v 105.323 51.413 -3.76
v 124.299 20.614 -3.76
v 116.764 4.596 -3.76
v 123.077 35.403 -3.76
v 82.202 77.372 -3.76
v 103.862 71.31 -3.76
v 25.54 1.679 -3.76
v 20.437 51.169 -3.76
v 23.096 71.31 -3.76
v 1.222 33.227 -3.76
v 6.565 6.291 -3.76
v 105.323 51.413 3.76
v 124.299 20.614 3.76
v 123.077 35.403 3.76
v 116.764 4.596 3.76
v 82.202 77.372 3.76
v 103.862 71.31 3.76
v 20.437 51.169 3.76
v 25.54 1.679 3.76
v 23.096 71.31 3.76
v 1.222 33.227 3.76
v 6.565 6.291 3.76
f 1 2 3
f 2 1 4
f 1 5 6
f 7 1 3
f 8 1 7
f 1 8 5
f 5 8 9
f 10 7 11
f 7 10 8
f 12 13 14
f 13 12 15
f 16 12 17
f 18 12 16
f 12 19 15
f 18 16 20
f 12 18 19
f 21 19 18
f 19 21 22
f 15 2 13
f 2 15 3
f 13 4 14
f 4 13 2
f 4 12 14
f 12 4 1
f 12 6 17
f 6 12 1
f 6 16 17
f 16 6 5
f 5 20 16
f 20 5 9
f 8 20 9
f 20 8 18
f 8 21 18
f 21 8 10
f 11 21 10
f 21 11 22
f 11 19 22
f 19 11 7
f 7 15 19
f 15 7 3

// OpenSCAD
/* doodle-meta {"version":1,"parameters":{"width":{"label":"Overall width","description":"Changes the body width","unit":"mm","feature":"body_width"},"height":{"label":"Overall height","description":"Changes the body height","unit":"mm","feature":"body_height"},"thickness":{"label":"Panel thickness","description":"Changes the panel depth","unit":"mm","feature":"body_thickness"},"slot_count":{"label":"Grille slot count","description":"Number of vertical grille slots","unit":"count","feature":"grille_slots"},"slot_width":{"label":"Grille slot width","description":"Width of each vertical grille slot","unit":"mm","feature":"grille_slots"},"slot_height":{"label":"Grille slot height","description":"Height of each vertical grille slot","unit":"mm","feature":"grille_slots"},"headlight_diameter":{"label":"Headlight diameter","description":"Diameter of the circular headlight cutouts","unit":"mm","feature":"headlights"}},"features":{"body_width":{"kind":"dimension","axis":"x","label":"Overall width"},"body_height":{"kind":"dimension","axis":"z","label":"Overall height"},"body_thickness":{"kind":"dimension","axis":"y","label":"Panel thickness"},"grille_slots":{"kind":"region","label":"Grille slots","min":[{"parameter":"width","scale":0.35},{"parameter":"thickness","scale":-0.1},{"parameter":"height","scale":0.13}],"max":[{"parameter":"width","scale":0.65},{"parameter":"thickness","scale":1.1},{"parameter":"height","scale":0.74}]},"headlights":{"kind":"region","label":"Headlights","min":[{"parameter":"width","scale":0.09},{"parameter":"thickness","scale":-0.1},{"parameter":"height","scale":0.37}],"max":[{"parameter":"width","scale":0.91},{"parameter":"thickness","scale":1.1},{"parameter":"height","scale":0.75}]}}} */

// Parameters
width = 126.0;
height = 78.83;
thickness = 7.52;
slot_count = 7;
slot_width = 5.1;
slot_height = 48.0;
headlight_diameter = 20.8;

// Derived sizes
eps = 0.01;
slot_pitch = width * 0.0625; // Approximate pitch based on measured centers
slot_start_x = width * 0.31; // Center of first slot
headlight_x = width * 0.175; // Center of left headlight
headlight_z = height * 0.563; // Center of headlights (from bottom)

module grille_body() {
    // Main panel body
    // The outer profile is roughly rectangular with rounded corners in the front view.
    // We approximate it with a cube for the main body, as the polygon is complex and 
    // the intent is a flat panel. The "rounded corners" in the description might refer 
    // to the overall shape or specific features, but a rectangular panel is the safest 
    // interpretation of "flat panel" with "complex outer boundary" that is mostly rectangular.
    // However, looking at the polygon, it has angled sides. 
    // Let's create a polygon for the front face and extrude it.
    
    // Front face polygon points (X, Z) normalized to 0..1 then scaled
    // Using the measured outer profile from view_2
    // Note: The polygon is defined in view coordinates (u, v).
    // u -> X, v -> Z (inverted because v is down, Z is up)
    
    polygon_points = [
        [0.0097 * width, (1 - 0.5785) * height],
        [0.0521 * width, (1 - 0.9202) * height],
        [0.2027 * width, (1 - 0.9787) * height],
        [0.9267 * width, (1 - 0.9417) * height],
        [0.9865 * width, (1 - 0.7385) * height],
        [0.9768 * width, (1 - 0.5509) * height],
        [0.8359 * width, (1 - 0.3478) * height],
        [0.8243 * width, (1 - 0.0954) * height],
        [0.6524 * width, (1 - 0.0185) * height],
        [0.1833 * width, (1 - 0.0954) * height],
        [0.1622 * width, (1 - 0.3509) * height]
    ];
    
    // Extrude the polygon along Y
    linear_extrude(height = thickness, center = true) {
        polygon(polygon_points);
    }
}

module headlight_cutout(x_pos) {
    // Circular cutout through the panel
    // Axis is Y (front-to-back)
    translate([x_pos, 0, headlight_z]) {
        rotate([90, 0, 0]) {
            cylinder(h = thickness + 2*eps, d = headlight_diameter, center = true);
        }
    }
}

module grille_slot(x_pos) {
    // Vertical rectangular slot
    // Axis is Y (front-to-back)
    // Slot is centered at x_pos, and vertically centered at height/2 roughly?
    // Measured center v is ~0.437. 
    // Z_center = (1 - 0.437) * height = 0.563 * height
    z_center = (1 - 0.437) * height;
    
    translate([x_pos, 0, z_center]) {
        cube([slot_width, thickness + 2*eps, slot_height], center = true);
    }
}

// Main design
difference() {
    // 1. Positive Body
    grille_body();
    
    // 2. Subtract Headlights
    headlight_cutout(headlight_x);
    headlight_cutout(width - headlight_x);
    
    // 3. Subtract Grille Slots
    for (i = [0 : slot_count - 1]) {
        // Calculate position for each slot
        // The slots are centered around the middle.
        // Total width of slots array = (slot_count - 1) * pitch
        // Start X = Center - TotalWidth/2
        // Or simply use the measured start and pitch.
        // Measured centers: 0.3098, 0.3736, 0.4353, 0.499, 0.5628, 0.6264, 0.6891
        // These are roughly evenly spaced.
        // Let's use the measured center of the first slot and the pitch.
        // First slot center u = 0.3098 -> X = 0.3098 * width
        // Pitch in u = (0.6891 - 0.3098) / 6 = 0.0632
        // Pitch in mm = 0.0632 * width
        
        slot_pitch_mm = (0.6891 - 0.3098) / 6 * width;
        slot_start_x_mm = 0.3098 * width;
        
        current_x = slot_start_x_mm + i * slot_pitch_mm;
        
        grille_slot(current_x);
    }
}
